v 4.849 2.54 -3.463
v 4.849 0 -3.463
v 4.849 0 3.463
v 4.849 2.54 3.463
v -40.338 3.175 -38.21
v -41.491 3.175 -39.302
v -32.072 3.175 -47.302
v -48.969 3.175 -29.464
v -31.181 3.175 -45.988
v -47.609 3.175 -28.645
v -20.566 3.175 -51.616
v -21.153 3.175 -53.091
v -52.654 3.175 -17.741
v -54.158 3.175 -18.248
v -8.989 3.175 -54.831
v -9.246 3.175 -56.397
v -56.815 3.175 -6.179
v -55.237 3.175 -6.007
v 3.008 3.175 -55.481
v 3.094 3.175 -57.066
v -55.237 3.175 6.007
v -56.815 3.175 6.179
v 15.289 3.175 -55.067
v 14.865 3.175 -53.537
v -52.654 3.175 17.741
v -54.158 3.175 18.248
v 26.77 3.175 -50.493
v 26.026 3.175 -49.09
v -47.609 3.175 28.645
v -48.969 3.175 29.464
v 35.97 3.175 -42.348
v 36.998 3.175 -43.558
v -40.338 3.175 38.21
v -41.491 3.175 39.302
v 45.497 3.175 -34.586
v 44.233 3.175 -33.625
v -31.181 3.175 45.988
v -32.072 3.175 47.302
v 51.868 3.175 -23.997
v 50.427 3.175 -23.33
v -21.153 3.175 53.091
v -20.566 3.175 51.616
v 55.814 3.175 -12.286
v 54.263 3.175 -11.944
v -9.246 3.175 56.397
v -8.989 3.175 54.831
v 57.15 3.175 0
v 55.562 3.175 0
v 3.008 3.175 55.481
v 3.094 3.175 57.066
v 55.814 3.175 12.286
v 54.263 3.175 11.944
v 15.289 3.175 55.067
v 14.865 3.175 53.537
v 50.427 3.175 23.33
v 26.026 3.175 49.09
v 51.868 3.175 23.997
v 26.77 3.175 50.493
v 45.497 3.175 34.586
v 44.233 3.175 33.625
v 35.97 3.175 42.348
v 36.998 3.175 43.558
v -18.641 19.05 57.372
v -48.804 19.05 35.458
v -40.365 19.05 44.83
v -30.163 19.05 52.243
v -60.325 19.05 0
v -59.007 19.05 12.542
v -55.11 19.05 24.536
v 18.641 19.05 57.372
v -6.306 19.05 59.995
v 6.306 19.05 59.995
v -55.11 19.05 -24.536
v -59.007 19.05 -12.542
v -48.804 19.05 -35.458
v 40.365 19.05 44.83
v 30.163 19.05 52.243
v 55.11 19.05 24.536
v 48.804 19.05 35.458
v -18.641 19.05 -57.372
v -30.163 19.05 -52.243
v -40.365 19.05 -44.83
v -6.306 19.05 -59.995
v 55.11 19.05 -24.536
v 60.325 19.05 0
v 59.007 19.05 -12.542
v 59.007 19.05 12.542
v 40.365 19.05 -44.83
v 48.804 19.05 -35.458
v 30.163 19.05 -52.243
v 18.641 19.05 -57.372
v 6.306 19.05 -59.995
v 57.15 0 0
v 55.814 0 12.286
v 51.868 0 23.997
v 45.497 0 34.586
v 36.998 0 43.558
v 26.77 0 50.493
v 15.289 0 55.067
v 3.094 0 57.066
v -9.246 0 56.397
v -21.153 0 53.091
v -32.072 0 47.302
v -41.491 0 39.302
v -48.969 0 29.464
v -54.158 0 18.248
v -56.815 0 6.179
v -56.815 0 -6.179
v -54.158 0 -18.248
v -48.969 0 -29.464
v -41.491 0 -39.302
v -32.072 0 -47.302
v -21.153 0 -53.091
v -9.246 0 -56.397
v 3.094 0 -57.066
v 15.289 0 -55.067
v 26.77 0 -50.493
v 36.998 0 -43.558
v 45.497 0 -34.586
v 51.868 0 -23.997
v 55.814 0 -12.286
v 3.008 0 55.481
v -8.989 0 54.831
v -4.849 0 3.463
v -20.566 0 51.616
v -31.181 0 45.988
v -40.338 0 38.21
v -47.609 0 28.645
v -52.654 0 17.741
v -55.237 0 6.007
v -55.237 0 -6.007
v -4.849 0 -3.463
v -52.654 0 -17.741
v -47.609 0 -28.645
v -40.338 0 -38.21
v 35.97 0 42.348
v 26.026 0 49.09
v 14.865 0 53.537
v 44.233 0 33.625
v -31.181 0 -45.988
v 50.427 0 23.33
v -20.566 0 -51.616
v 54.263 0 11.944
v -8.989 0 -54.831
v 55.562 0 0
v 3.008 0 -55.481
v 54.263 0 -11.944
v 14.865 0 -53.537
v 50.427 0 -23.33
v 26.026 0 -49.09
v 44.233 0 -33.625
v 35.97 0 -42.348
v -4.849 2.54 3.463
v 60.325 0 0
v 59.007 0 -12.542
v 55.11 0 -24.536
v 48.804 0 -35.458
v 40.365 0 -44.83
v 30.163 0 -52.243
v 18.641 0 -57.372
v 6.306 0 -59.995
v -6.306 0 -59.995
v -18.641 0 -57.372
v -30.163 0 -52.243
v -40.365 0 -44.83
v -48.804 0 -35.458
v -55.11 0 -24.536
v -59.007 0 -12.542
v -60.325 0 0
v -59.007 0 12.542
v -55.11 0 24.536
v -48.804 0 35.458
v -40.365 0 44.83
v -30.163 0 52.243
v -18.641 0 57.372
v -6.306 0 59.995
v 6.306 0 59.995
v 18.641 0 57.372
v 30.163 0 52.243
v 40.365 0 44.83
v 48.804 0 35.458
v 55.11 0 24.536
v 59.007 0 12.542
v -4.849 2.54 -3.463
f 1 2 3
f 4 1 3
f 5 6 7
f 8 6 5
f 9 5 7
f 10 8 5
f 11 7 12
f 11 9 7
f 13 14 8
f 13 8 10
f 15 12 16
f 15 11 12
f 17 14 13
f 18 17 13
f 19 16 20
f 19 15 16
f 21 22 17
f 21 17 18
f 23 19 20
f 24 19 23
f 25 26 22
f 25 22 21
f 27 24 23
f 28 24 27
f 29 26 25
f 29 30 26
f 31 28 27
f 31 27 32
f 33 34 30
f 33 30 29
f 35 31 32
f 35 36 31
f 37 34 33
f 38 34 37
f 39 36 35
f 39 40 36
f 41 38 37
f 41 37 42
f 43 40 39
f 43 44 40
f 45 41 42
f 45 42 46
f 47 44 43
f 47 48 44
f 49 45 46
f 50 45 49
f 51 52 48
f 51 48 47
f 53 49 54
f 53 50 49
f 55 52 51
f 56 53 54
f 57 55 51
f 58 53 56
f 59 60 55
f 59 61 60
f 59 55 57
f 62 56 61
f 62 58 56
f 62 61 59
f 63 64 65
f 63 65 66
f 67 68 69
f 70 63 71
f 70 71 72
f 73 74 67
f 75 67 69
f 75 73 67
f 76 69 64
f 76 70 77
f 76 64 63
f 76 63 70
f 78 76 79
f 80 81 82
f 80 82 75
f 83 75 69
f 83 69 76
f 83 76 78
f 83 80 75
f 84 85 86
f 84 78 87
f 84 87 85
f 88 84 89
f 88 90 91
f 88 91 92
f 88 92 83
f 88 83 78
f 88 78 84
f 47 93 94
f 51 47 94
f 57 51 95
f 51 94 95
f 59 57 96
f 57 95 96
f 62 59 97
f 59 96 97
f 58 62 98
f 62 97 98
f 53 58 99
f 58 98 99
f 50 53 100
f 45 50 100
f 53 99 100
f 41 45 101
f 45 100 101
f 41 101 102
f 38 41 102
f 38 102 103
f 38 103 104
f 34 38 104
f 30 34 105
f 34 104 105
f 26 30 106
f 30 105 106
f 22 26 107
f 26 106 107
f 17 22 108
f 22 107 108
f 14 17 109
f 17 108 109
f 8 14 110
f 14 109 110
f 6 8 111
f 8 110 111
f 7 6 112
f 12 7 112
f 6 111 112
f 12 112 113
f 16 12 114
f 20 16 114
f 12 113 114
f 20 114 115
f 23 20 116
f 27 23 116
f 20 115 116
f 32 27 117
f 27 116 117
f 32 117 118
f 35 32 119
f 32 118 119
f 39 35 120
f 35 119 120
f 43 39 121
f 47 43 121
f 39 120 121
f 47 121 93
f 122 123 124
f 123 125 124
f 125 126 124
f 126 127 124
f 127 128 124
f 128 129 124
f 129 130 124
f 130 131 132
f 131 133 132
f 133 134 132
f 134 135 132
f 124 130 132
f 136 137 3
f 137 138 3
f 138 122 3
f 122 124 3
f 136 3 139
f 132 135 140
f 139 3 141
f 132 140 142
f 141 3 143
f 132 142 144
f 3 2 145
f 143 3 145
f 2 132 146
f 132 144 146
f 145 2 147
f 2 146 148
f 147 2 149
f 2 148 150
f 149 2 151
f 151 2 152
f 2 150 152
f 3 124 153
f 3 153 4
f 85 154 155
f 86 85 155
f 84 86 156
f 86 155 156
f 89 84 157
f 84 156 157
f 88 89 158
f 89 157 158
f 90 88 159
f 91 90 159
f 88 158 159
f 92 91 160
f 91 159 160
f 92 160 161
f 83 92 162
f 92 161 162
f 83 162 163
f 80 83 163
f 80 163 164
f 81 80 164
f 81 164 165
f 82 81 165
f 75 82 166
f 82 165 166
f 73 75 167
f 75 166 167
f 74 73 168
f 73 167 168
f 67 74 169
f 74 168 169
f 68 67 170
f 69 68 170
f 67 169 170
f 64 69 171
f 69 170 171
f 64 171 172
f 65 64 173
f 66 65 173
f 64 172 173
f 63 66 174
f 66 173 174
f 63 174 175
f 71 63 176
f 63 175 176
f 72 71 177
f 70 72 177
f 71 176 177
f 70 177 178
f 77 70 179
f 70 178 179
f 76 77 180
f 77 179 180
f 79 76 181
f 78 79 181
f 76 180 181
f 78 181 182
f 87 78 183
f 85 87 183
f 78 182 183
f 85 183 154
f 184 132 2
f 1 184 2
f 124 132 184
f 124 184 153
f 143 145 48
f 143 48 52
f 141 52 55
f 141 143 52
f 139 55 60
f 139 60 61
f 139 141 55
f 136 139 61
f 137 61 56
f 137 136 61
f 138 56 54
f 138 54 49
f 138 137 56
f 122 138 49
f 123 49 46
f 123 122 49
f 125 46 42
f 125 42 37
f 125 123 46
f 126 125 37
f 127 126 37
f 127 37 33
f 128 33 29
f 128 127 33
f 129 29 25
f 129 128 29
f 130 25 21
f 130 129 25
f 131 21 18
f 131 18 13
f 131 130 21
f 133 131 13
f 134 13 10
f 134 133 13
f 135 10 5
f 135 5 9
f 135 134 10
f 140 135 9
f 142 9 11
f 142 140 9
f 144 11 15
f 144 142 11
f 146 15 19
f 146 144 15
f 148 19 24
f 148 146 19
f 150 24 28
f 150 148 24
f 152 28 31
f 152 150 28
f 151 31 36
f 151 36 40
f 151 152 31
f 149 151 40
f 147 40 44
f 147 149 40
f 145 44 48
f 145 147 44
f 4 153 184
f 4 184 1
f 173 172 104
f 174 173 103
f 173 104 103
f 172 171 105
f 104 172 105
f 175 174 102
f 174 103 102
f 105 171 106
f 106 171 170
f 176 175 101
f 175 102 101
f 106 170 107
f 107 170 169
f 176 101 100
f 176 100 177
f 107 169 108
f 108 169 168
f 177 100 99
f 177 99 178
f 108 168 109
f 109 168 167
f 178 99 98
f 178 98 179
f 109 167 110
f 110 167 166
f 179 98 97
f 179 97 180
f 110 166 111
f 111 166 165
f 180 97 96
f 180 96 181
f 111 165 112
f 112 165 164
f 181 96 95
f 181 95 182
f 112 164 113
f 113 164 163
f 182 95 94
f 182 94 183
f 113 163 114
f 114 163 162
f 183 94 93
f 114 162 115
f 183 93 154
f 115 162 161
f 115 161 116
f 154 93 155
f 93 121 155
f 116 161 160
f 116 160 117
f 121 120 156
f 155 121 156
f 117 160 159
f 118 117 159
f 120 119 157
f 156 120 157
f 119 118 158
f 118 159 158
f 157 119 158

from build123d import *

# Parameters (mm, degrees)
SKETCH1_R           = 60.325
BOSS_EXTRUDE1_DEPTH = 19.05
SKETCH2_R           = 57.15
SKETCH2_R_2         = 55.5625
CUT_EXTRUDE1_DEPTH  = 3.175
SKETCH3_W           = 9.697234664
SKETCH3_H           = 6.926230082
CUT_EXTRUDE2_DEPTH  = 2.54


with BuildPart() as part:
    # Sketch1 → Boss-Extrude1 (new body)
    with BuildSketch(Plane(origin=(0, 0, 0), x_dir=(1, 0, 0), z_dir=(0, 1, 0))):
        Circle(SKETCH1_R)
    extrude(amount=BOSS_EXTRUDE1_DEPTH)

    # Sketch2 → Cut-Extrude1 (cut)
    with BuildSketch(Plane.XZ):
        Circle(SKETCH2_R)
        Circle(SKETCH2_R_2, mode=Mode.SUBTRACT)
    extrude(amount=-CUT_EXTRUDE1_DEPTH, mode=Mode.SUBTRACT)

    # Sketch3 → Cut-Extrude2 (cut)
    with BuildSketch(Plane.XZ):
        Rectangle(SKETCH3_W, SKETCH3_H)
    extrude(amount=-CUT_EXTRUDE2_DEPTH, mode=Mode.SUBTRACT)


solid = part.part
